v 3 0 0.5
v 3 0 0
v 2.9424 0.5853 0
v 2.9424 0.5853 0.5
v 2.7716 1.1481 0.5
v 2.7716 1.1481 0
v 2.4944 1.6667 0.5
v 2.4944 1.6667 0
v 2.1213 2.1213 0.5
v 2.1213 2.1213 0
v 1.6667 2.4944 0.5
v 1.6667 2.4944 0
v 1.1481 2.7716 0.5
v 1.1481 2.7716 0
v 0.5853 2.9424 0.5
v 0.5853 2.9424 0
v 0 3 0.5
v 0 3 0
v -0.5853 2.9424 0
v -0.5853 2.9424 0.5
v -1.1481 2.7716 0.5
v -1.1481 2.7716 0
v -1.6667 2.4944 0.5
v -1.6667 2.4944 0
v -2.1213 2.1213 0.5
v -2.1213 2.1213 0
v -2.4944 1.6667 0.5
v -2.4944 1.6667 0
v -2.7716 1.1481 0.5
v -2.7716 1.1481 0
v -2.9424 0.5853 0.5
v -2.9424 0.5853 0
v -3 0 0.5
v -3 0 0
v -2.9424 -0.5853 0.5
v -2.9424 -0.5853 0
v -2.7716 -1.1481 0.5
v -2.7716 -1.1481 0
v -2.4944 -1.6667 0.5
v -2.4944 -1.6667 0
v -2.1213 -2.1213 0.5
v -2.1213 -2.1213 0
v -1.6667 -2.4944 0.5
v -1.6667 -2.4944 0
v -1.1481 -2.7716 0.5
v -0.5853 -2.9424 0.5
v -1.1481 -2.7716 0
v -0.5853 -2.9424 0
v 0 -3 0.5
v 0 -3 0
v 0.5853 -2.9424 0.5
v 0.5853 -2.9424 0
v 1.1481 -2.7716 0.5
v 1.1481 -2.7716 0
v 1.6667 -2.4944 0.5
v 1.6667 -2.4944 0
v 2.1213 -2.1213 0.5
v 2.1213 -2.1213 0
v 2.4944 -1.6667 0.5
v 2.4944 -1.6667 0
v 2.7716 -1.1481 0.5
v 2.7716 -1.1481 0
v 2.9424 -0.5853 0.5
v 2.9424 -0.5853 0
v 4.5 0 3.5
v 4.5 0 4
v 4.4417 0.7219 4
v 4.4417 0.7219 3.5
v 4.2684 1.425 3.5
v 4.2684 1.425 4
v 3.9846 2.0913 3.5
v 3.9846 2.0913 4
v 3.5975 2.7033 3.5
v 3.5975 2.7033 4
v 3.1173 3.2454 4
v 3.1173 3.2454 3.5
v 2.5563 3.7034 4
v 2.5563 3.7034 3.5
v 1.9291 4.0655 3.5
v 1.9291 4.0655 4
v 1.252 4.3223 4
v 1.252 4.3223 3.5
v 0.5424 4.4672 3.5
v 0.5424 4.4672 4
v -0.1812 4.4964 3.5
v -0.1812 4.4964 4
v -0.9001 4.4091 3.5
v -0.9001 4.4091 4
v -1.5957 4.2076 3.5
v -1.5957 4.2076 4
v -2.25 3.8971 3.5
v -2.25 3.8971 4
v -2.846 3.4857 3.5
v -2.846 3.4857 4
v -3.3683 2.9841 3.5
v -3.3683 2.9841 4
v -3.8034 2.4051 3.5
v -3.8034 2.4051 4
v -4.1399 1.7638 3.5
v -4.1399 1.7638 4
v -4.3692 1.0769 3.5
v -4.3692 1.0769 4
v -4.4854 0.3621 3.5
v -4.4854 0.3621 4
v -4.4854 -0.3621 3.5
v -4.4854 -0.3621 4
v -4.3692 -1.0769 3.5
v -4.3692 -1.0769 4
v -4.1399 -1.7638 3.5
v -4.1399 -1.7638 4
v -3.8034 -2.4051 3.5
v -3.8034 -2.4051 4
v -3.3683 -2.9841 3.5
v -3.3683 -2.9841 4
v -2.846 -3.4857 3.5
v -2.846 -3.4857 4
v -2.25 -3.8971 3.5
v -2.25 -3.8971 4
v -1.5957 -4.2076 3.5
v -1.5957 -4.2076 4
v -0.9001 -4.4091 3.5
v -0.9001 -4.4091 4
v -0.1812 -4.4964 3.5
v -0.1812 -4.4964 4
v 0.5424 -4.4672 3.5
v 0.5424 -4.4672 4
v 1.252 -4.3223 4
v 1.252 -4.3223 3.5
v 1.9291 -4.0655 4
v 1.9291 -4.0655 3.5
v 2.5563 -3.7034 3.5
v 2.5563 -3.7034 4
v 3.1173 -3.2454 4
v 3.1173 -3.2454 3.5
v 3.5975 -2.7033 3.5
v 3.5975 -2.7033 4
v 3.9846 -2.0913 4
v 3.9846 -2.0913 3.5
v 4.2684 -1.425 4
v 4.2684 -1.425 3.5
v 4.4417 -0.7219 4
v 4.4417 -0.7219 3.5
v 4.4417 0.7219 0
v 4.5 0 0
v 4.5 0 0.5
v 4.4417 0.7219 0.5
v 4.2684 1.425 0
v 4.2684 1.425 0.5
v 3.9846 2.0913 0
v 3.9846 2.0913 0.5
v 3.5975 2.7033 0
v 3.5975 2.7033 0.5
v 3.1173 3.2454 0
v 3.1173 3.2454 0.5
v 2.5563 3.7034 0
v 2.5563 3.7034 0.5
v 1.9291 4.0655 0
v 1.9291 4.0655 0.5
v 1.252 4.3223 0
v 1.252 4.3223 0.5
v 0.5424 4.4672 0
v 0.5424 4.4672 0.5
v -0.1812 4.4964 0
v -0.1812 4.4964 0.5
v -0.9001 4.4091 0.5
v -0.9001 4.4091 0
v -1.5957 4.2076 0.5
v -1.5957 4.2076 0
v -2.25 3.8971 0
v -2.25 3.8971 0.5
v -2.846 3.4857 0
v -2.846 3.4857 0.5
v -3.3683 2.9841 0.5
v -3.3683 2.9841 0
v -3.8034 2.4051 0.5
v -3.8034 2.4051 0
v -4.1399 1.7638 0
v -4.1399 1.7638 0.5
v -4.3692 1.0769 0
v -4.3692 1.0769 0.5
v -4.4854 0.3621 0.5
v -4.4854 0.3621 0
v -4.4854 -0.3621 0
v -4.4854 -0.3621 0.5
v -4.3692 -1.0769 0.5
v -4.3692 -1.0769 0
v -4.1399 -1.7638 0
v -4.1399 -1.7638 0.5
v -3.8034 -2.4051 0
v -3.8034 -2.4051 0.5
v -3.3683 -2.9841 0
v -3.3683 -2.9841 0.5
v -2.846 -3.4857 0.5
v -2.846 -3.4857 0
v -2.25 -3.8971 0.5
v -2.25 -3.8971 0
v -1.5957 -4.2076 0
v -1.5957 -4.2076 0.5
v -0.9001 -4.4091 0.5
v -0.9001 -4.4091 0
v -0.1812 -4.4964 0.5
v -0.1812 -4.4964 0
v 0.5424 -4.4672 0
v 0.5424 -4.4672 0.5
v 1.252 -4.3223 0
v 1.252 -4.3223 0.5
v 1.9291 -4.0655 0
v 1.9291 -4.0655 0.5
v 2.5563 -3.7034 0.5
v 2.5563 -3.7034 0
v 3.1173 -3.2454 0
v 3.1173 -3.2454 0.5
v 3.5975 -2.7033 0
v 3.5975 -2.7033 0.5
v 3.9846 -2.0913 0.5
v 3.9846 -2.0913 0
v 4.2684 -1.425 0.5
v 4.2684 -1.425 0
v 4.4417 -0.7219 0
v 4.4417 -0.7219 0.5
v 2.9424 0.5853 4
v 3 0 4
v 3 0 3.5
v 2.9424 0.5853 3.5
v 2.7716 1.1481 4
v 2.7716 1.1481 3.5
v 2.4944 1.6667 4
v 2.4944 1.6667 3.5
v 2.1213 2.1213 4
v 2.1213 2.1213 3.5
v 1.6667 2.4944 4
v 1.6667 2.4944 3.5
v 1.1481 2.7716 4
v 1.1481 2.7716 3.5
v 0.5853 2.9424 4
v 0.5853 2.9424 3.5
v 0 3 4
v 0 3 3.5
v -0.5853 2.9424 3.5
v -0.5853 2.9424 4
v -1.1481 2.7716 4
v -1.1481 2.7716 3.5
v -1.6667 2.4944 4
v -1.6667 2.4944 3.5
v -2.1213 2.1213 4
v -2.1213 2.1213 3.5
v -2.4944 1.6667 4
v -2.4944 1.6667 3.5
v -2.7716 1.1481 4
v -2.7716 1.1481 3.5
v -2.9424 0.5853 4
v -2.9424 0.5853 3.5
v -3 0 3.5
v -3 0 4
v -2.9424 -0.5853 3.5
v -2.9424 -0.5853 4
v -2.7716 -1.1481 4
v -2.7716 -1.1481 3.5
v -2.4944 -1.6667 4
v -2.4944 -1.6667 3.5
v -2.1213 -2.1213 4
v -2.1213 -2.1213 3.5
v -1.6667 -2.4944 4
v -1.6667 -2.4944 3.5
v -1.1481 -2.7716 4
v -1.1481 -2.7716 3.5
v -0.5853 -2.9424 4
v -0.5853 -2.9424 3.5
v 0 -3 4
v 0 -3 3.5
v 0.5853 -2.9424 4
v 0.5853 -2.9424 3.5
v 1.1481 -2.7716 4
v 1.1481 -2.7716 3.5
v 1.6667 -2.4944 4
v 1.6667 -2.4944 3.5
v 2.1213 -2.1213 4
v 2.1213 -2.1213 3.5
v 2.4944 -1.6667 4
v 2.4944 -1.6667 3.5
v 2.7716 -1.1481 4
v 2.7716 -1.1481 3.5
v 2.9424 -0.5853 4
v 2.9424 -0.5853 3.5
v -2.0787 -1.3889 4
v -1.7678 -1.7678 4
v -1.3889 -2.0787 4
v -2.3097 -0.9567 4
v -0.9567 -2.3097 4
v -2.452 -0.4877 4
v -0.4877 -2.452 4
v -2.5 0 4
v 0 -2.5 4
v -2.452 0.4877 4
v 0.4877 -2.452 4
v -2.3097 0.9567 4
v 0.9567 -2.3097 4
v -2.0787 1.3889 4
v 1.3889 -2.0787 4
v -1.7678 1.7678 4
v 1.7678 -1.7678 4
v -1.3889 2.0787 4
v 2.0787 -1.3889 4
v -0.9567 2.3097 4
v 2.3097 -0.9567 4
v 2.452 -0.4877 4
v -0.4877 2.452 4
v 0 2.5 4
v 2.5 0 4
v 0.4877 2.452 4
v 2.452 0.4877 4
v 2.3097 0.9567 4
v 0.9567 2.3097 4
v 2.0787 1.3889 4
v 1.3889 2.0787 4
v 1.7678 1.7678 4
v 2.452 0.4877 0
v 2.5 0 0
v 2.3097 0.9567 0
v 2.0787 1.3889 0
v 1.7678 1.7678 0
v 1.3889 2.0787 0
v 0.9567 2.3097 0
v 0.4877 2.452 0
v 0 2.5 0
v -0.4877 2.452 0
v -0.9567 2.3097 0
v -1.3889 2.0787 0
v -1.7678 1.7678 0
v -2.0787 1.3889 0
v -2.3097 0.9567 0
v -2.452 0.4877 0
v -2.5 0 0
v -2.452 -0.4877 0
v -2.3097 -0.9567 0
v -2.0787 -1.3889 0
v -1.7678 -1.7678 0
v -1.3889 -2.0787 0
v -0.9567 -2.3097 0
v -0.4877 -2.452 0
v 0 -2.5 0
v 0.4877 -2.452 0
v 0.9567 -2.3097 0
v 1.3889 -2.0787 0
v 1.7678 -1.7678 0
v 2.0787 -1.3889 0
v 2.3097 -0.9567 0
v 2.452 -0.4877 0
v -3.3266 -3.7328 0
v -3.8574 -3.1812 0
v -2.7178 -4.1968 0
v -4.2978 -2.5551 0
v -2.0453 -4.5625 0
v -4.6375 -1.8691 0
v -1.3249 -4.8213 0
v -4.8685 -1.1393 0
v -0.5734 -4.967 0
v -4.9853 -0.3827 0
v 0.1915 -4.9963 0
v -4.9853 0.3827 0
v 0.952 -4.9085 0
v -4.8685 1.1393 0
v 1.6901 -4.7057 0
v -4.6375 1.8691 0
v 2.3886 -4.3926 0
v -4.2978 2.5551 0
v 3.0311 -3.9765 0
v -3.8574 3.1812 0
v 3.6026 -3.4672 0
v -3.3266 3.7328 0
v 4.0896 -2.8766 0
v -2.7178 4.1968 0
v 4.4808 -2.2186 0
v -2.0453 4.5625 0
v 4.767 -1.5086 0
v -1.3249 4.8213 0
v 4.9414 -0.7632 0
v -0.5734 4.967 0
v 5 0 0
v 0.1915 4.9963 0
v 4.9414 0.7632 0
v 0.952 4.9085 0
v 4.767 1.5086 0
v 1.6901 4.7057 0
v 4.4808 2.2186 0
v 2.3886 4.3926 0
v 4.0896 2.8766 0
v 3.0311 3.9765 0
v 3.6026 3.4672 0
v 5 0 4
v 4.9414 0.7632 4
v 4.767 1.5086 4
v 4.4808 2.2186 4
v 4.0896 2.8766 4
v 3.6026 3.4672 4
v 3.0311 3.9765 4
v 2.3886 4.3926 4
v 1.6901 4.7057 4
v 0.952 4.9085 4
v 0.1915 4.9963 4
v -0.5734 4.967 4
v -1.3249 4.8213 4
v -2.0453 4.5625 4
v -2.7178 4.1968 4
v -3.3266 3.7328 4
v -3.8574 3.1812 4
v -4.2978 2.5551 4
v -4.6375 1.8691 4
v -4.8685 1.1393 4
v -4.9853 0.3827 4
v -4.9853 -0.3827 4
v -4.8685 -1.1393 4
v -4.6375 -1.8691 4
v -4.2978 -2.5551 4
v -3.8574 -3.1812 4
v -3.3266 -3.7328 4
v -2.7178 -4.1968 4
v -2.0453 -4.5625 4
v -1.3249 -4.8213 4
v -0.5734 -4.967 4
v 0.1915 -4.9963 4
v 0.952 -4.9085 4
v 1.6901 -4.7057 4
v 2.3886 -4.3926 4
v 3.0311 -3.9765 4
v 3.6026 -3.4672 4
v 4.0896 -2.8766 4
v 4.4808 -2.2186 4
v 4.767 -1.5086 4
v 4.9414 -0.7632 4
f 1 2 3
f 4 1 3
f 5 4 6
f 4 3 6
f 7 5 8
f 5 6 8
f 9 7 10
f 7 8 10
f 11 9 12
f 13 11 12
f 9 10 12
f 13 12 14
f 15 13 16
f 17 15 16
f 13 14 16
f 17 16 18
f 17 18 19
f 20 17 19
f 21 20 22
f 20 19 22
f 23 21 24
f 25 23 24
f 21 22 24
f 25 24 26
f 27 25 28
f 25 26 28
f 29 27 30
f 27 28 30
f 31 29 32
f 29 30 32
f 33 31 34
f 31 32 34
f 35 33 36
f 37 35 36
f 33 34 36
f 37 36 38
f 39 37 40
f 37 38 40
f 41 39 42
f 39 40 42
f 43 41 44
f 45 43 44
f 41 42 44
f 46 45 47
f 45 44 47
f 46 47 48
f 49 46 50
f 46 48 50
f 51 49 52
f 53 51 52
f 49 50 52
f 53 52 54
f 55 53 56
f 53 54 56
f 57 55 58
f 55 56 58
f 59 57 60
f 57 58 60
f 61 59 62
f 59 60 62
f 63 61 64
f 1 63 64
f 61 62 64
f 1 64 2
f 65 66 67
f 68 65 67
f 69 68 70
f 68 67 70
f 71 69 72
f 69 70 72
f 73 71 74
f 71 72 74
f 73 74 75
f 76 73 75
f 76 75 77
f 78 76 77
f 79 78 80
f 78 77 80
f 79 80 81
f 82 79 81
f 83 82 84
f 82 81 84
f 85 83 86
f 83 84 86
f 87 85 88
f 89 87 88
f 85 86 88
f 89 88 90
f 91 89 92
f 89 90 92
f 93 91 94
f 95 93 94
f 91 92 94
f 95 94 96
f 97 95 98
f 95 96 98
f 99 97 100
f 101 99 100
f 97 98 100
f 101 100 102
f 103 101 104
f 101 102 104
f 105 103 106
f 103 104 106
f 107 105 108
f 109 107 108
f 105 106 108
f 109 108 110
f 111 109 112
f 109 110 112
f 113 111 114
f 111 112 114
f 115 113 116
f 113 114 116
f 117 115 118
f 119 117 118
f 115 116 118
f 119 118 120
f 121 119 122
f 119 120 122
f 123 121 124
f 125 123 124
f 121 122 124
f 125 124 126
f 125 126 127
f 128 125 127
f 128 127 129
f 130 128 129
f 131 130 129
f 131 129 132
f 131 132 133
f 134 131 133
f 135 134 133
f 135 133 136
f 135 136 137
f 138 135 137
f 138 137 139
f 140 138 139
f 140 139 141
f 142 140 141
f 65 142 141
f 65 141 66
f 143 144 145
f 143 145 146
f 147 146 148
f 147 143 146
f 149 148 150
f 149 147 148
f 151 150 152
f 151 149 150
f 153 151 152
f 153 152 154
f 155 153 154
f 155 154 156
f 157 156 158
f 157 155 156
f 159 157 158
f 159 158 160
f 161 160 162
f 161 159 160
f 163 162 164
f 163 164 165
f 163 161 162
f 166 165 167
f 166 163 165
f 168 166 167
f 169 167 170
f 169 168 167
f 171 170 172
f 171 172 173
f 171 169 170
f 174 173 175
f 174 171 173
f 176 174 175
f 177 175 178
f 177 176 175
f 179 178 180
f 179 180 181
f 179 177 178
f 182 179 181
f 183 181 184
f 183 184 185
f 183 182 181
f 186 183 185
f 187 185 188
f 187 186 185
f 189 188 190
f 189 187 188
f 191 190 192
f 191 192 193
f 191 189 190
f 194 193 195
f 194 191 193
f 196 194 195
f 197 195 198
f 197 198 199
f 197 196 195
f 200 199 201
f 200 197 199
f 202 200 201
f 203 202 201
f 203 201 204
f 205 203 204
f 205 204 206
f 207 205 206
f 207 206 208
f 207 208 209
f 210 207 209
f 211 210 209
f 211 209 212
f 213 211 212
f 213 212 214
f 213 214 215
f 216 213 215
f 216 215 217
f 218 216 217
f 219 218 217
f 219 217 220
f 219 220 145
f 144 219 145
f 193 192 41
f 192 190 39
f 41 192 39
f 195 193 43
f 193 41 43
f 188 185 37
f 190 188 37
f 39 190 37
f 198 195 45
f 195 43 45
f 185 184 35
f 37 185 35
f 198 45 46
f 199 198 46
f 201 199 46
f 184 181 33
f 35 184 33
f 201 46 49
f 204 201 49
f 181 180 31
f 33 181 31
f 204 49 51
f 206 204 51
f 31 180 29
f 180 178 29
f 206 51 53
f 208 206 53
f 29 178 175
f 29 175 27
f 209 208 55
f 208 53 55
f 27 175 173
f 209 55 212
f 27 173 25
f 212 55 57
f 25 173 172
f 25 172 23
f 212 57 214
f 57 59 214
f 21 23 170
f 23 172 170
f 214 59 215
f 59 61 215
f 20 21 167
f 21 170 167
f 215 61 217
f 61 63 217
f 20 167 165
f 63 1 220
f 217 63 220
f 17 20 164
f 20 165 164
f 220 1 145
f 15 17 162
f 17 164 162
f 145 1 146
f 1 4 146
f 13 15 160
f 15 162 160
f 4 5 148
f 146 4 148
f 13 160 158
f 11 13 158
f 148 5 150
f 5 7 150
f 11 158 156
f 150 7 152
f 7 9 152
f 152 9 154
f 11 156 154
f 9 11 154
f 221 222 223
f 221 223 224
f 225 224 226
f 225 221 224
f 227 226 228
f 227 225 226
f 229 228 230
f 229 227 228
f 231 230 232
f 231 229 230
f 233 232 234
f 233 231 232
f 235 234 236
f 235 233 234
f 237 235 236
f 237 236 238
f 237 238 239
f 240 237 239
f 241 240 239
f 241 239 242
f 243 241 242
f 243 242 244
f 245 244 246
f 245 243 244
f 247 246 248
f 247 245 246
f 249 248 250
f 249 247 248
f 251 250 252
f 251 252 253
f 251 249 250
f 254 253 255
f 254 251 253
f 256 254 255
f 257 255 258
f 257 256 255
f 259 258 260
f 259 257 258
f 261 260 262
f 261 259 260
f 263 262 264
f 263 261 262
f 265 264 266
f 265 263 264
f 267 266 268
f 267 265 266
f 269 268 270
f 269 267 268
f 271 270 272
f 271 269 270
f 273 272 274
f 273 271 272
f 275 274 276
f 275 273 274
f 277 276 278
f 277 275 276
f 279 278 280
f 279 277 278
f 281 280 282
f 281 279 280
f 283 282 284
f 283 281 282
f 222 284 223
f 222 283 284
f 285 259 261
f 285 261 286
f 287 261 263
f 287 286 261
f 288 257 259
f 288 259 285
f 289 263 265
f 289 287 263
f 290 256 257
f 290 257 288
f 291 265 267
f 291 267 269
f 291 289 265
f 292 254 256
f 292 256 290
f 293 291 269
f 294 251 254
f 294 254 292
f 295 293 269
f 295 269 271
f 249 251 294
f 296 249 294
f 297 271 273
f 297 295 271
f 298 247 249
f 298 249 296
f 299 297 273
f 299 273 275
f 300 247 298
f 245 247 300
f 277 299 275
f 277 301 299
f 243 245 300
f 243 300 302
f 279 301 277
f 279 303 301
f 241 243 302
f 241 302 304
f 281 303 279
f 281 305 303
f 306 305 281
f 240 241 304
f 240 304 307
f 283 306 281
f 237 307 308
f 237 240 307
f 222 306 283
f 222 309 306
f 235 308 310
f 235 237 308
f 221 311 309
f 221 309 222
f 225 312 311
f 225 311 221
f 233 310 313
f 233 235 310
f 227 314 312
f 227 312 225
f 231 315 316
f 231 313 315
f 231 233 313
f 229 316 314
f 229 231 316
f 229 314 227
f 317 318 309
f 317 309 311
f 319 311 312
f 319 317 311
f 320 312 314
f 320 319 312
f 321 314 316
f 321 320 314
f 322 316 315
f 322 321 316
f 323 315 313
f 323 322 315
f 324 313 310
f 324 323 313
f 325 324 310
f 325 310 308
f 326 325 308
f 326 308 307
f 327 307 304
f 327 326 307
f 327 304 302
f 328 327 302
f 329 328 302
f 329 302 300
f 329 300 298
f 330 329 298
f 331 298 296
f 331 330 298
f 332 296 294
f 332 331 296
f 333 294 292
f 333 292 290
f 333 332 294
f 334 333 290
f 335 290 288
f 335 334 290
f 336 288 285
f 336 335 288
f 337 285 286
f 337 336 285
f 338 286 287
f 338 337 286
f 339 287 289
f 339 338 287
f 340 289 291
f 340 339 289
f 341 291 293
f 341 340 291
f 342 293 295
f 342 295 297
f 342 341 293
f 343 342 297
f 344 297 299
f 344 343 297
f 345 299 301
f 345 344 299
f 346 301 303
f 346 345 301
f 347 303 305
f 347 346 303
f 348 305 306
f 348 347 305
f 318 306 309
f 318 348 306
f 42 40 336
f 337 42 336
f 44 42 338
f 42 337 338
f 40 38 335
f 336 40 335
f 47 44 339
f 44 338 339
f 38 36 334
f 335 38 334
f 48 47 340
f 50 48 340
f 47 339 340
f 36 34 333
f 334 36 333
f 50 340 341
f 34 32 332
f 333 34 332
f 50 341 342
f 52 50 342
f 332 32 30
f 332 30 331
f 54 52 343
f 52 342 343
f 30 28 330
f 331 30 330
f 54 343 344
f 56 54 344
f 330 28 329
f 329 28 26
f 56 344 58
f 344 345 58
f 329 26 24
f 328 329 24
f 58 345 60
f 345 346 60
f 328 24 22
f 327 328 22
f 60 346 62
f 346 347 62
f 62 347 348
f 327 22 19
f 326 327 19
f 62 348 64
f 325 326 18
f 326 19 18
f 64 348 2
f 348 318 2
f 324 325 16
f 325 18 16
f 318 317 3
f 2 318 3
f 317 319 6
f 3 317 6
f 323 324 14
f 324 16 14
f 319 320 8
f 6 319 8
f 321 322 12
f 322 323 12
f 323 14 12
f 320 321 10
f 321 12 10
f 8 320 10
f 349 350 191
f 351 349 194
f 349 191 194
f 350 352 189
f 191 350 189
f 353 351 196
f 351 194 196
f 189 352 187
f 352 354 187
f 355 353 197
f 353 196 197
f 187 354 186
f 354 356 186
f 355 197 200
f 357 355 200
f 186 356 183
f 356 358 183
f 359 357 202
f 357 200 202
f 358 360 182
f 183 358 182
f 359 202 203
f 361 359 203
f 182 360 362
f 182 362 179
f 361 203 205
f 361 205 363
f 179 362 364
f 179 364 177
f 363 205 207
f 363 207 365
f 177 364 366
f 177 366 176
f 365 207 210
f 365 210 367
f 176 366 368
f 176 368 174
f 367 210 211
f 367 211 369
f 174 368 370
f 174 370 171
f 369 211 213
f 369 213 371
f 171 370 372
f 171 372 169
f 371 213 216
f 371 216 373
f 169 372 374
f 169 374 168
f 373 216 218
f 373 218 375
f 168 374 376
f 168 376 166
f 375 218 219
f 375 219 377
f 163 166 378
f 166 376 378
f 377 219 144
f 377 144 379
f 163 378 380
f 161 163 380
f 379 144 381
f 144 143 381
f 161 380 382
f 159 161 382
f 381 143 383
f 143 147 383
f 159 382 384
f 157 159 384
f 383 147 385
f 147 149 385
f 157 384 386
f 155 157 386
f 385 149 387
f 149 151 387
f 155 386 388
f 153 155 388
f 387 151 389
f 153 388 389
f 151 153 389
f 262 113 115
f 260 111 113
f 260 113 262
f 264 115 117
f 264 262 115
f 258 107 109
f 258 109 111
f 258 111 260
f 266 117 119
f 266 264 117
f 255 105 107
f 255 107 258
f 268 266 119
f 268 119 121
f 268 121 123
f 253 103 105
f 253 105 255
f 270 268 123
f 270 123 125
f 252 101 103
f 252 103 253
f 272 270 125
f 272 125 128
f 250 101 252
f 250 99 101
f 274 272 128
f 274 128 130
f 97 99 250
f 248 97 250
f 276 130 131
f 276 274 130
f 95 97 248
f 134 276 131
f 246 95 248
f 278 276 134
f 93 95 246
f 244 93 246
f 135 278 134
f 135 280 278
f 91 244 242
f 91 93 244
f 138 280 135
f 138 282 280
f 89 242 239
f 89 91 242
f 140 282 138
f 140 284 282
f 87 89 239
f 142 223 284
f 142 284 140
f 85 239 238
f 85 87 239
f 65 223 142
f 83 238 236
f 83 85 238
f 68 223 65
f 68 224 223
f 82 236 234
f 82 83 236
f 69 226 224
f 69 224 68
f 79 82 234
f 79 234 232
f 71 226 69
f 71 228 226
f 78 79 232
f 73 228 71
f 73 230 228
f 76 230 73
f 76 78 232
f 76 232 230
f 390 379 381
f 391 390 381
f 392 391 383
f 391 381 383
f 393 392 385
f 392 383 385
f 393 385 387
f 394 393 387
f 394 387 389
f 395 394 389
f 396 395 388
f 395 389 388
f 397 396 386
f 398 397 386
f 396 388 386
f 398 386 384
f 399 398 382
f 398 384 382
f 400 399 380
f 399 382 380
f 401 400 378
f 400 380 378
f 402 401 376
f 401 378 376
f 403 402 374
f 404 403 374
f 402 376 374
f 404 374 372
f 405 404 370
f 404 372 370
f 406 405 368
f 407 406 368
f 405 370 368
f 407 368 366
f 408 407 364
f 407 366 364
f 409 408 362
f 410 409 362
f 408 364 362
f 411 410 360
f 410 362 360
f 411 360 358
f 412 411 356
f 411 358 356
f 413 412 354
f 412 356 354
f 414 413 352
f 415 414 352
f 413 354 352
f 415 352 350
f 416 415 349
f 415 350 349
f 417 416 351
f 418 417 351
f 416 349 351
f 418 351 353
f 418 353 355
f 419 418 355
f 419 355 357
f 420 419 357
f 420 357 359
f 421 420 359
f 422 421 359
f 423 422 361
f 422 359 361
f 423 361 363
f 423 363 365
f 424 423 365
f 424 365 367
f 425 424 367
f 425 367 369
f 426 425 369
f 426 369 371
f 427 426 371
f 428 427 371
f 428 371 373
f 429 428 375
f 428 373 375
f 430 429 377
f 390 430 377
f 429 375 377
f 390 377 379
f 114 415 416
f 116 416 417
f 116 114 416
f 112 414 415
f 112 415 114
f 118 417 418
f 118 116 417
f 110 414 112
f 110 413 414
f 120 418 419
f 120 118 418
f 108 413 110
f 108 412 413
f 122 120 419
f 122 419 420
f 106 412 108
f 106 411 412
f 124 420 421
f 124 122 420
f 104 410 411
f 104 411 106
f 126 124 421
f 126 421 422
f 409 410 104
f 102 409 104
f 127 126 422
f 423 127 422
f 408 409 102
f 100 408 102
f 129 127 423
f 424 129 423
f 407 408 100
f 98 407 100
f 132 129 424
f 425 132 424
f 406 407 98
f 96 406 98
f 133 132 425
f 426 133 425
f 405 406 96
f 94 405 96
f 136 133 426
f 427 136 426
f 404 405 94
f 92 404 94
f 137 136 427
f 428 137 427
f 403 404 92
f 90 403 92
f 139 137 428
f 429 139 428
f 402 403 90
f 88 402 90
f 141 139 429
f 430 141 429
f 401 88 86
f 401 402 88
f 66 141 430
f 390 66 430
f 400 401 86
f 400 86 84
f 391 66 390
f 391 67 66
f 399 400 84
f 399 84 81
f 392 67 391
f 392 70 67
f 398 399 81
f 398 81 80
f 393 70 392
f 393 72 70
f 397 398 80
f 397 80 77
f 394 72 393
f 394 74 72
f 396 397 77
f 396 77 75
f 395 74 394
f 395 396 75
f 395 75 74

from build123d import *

# Parameters (mm, degrees)
SKETCH_2_R          = 5
SKETCH_2_R_2        = 2.5
EXTRUDE_1_DEPTH     = 4
SKETCH_3_R          = 4.5
SKETCH_3_R_2        = 3
CUT_EXTRUDE_1_DEPTH = 0.5
CUT_EXTRUDE_START   = -4
SKETCH_3_2_R        = 4.5
SKETCH_3_2_R_2      = 3
CUT_EXTRUDE_2_DEPTH = 0.5


with BuildPart() as part:
    # 草图2 → 凸台-拉伸1 (new body)
    with BuildSketch(Plane.XY):
        Circle(SKETCH_2_R)
        Circle(SKETCH_2_R_2, mode=Mode.SUBTRACT)
    extrude(amount=EXTRUDE_1_DEPTH)

    # 草图3 → 切除-拉伸1 (cut)
    with BuildSketch(Plane.XY.offset(4)):
        Circle(SKETCH_3_R)
        Circle(SKETCH_3_R_2, mode=Mode.SUBTRACT)
    extrude(amount=-CUT_EXTRUDE_1_DEPTH, mode=Mode.SUBTRACT)

    # 草图3<2> → 切除-拉伸2 (cut)
    with BuildSketch(Plane.XY.offset(4).offset(CUT_EXTRUDE_START)):
        Circle(SKETCH_3_2_R)
        Circle(SKETCH_3_2_R_2, mode=Mode.SUBTRACT)
    extrude(amount=CUT_EXTRUDE_2_DEPTH, mode=Mode.SUBTRACT)


solid = part.part
